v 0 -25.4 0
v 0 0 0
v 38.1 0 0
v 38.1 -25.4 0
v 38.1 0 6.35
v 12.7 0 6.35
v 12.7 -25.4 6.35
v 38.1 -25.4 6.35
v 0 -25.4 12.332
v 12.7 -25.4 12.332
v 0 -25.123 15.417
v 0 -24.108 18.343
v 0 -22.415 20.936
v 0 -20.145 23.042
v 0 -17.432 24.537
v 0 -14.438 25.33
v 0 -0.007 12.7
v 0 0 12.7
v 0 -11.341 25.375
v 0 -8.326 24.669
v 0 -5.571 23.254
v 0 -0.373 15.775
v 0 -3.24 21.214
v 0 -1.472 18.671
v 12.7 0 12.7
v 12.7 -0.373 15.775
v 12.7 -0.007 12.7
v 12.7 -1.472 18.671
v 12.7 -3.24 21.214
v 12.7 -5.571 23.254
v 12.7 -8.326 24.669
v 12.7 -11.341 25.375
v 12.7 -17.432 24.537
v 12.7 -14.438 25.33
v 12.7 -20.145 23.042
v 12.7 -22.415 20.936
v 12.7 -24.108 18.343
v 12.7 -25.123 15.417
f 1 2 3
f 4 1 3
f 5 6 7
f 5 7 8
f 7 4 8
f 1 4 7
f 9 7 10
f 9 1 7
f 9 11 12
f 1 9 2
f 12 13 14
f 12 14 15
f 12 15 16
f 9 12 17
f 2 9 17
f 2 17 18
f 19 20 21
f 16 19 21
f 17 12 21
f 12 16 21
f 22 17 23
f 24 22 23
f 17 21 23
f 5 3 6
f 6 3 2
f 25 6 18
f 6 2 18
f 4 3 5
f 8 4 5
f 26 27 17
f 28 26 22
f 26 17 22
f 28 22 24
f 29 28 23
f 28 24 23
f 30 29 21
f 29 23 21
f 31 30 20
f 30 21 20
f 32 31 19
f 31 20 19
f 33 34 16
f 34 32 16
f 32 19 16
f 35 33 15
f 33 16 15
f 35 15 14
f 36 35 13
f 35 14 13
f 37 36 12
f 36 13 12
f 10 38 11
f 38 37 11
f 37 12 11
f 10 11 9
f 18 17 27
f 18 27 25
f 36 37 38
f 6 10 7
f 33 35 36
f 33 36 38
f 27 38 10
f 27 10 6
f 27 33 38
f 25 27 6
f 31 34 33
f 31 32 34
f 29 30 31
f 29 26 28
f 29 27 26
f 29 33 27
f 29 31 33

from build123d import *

# Parameters (mm, degrees)
F0_W     = 38.1
F0_H     = 6.35
F1_DEPTH = 25.4
F2_W     = 25.4
F2_H     = 6.35
F3_DEPTH = 12.7
F4_R     = 12.7
F5_DEPTH = 12.7


with BuildPart() as f1:
    # F0 (on Front) → F1 (new body)
    with BuildSketch(Plane.XZ):
        with Locations((19.05, 3.175)):
            Rectangle(F0_W, F0_H)
    extrude(amount=F1_DEPTH)

    # F2 (on Right) → F3 (join)
    with BuildSketch(Plane.YZ):
        with Locations((-12.7, 9.525)):
            Rectangle(F2_W, F2_H)
    extrude(amount=F3_DEPTH)

    # F4 (on Right) → F5 (join)
    with BuildSketch(Plane.YZ):
        with Locations((-12.706821, 12.748167)):
            Circle(F4_R)
    extrude(amount=F5_DEPTH)


solid = f1.part
